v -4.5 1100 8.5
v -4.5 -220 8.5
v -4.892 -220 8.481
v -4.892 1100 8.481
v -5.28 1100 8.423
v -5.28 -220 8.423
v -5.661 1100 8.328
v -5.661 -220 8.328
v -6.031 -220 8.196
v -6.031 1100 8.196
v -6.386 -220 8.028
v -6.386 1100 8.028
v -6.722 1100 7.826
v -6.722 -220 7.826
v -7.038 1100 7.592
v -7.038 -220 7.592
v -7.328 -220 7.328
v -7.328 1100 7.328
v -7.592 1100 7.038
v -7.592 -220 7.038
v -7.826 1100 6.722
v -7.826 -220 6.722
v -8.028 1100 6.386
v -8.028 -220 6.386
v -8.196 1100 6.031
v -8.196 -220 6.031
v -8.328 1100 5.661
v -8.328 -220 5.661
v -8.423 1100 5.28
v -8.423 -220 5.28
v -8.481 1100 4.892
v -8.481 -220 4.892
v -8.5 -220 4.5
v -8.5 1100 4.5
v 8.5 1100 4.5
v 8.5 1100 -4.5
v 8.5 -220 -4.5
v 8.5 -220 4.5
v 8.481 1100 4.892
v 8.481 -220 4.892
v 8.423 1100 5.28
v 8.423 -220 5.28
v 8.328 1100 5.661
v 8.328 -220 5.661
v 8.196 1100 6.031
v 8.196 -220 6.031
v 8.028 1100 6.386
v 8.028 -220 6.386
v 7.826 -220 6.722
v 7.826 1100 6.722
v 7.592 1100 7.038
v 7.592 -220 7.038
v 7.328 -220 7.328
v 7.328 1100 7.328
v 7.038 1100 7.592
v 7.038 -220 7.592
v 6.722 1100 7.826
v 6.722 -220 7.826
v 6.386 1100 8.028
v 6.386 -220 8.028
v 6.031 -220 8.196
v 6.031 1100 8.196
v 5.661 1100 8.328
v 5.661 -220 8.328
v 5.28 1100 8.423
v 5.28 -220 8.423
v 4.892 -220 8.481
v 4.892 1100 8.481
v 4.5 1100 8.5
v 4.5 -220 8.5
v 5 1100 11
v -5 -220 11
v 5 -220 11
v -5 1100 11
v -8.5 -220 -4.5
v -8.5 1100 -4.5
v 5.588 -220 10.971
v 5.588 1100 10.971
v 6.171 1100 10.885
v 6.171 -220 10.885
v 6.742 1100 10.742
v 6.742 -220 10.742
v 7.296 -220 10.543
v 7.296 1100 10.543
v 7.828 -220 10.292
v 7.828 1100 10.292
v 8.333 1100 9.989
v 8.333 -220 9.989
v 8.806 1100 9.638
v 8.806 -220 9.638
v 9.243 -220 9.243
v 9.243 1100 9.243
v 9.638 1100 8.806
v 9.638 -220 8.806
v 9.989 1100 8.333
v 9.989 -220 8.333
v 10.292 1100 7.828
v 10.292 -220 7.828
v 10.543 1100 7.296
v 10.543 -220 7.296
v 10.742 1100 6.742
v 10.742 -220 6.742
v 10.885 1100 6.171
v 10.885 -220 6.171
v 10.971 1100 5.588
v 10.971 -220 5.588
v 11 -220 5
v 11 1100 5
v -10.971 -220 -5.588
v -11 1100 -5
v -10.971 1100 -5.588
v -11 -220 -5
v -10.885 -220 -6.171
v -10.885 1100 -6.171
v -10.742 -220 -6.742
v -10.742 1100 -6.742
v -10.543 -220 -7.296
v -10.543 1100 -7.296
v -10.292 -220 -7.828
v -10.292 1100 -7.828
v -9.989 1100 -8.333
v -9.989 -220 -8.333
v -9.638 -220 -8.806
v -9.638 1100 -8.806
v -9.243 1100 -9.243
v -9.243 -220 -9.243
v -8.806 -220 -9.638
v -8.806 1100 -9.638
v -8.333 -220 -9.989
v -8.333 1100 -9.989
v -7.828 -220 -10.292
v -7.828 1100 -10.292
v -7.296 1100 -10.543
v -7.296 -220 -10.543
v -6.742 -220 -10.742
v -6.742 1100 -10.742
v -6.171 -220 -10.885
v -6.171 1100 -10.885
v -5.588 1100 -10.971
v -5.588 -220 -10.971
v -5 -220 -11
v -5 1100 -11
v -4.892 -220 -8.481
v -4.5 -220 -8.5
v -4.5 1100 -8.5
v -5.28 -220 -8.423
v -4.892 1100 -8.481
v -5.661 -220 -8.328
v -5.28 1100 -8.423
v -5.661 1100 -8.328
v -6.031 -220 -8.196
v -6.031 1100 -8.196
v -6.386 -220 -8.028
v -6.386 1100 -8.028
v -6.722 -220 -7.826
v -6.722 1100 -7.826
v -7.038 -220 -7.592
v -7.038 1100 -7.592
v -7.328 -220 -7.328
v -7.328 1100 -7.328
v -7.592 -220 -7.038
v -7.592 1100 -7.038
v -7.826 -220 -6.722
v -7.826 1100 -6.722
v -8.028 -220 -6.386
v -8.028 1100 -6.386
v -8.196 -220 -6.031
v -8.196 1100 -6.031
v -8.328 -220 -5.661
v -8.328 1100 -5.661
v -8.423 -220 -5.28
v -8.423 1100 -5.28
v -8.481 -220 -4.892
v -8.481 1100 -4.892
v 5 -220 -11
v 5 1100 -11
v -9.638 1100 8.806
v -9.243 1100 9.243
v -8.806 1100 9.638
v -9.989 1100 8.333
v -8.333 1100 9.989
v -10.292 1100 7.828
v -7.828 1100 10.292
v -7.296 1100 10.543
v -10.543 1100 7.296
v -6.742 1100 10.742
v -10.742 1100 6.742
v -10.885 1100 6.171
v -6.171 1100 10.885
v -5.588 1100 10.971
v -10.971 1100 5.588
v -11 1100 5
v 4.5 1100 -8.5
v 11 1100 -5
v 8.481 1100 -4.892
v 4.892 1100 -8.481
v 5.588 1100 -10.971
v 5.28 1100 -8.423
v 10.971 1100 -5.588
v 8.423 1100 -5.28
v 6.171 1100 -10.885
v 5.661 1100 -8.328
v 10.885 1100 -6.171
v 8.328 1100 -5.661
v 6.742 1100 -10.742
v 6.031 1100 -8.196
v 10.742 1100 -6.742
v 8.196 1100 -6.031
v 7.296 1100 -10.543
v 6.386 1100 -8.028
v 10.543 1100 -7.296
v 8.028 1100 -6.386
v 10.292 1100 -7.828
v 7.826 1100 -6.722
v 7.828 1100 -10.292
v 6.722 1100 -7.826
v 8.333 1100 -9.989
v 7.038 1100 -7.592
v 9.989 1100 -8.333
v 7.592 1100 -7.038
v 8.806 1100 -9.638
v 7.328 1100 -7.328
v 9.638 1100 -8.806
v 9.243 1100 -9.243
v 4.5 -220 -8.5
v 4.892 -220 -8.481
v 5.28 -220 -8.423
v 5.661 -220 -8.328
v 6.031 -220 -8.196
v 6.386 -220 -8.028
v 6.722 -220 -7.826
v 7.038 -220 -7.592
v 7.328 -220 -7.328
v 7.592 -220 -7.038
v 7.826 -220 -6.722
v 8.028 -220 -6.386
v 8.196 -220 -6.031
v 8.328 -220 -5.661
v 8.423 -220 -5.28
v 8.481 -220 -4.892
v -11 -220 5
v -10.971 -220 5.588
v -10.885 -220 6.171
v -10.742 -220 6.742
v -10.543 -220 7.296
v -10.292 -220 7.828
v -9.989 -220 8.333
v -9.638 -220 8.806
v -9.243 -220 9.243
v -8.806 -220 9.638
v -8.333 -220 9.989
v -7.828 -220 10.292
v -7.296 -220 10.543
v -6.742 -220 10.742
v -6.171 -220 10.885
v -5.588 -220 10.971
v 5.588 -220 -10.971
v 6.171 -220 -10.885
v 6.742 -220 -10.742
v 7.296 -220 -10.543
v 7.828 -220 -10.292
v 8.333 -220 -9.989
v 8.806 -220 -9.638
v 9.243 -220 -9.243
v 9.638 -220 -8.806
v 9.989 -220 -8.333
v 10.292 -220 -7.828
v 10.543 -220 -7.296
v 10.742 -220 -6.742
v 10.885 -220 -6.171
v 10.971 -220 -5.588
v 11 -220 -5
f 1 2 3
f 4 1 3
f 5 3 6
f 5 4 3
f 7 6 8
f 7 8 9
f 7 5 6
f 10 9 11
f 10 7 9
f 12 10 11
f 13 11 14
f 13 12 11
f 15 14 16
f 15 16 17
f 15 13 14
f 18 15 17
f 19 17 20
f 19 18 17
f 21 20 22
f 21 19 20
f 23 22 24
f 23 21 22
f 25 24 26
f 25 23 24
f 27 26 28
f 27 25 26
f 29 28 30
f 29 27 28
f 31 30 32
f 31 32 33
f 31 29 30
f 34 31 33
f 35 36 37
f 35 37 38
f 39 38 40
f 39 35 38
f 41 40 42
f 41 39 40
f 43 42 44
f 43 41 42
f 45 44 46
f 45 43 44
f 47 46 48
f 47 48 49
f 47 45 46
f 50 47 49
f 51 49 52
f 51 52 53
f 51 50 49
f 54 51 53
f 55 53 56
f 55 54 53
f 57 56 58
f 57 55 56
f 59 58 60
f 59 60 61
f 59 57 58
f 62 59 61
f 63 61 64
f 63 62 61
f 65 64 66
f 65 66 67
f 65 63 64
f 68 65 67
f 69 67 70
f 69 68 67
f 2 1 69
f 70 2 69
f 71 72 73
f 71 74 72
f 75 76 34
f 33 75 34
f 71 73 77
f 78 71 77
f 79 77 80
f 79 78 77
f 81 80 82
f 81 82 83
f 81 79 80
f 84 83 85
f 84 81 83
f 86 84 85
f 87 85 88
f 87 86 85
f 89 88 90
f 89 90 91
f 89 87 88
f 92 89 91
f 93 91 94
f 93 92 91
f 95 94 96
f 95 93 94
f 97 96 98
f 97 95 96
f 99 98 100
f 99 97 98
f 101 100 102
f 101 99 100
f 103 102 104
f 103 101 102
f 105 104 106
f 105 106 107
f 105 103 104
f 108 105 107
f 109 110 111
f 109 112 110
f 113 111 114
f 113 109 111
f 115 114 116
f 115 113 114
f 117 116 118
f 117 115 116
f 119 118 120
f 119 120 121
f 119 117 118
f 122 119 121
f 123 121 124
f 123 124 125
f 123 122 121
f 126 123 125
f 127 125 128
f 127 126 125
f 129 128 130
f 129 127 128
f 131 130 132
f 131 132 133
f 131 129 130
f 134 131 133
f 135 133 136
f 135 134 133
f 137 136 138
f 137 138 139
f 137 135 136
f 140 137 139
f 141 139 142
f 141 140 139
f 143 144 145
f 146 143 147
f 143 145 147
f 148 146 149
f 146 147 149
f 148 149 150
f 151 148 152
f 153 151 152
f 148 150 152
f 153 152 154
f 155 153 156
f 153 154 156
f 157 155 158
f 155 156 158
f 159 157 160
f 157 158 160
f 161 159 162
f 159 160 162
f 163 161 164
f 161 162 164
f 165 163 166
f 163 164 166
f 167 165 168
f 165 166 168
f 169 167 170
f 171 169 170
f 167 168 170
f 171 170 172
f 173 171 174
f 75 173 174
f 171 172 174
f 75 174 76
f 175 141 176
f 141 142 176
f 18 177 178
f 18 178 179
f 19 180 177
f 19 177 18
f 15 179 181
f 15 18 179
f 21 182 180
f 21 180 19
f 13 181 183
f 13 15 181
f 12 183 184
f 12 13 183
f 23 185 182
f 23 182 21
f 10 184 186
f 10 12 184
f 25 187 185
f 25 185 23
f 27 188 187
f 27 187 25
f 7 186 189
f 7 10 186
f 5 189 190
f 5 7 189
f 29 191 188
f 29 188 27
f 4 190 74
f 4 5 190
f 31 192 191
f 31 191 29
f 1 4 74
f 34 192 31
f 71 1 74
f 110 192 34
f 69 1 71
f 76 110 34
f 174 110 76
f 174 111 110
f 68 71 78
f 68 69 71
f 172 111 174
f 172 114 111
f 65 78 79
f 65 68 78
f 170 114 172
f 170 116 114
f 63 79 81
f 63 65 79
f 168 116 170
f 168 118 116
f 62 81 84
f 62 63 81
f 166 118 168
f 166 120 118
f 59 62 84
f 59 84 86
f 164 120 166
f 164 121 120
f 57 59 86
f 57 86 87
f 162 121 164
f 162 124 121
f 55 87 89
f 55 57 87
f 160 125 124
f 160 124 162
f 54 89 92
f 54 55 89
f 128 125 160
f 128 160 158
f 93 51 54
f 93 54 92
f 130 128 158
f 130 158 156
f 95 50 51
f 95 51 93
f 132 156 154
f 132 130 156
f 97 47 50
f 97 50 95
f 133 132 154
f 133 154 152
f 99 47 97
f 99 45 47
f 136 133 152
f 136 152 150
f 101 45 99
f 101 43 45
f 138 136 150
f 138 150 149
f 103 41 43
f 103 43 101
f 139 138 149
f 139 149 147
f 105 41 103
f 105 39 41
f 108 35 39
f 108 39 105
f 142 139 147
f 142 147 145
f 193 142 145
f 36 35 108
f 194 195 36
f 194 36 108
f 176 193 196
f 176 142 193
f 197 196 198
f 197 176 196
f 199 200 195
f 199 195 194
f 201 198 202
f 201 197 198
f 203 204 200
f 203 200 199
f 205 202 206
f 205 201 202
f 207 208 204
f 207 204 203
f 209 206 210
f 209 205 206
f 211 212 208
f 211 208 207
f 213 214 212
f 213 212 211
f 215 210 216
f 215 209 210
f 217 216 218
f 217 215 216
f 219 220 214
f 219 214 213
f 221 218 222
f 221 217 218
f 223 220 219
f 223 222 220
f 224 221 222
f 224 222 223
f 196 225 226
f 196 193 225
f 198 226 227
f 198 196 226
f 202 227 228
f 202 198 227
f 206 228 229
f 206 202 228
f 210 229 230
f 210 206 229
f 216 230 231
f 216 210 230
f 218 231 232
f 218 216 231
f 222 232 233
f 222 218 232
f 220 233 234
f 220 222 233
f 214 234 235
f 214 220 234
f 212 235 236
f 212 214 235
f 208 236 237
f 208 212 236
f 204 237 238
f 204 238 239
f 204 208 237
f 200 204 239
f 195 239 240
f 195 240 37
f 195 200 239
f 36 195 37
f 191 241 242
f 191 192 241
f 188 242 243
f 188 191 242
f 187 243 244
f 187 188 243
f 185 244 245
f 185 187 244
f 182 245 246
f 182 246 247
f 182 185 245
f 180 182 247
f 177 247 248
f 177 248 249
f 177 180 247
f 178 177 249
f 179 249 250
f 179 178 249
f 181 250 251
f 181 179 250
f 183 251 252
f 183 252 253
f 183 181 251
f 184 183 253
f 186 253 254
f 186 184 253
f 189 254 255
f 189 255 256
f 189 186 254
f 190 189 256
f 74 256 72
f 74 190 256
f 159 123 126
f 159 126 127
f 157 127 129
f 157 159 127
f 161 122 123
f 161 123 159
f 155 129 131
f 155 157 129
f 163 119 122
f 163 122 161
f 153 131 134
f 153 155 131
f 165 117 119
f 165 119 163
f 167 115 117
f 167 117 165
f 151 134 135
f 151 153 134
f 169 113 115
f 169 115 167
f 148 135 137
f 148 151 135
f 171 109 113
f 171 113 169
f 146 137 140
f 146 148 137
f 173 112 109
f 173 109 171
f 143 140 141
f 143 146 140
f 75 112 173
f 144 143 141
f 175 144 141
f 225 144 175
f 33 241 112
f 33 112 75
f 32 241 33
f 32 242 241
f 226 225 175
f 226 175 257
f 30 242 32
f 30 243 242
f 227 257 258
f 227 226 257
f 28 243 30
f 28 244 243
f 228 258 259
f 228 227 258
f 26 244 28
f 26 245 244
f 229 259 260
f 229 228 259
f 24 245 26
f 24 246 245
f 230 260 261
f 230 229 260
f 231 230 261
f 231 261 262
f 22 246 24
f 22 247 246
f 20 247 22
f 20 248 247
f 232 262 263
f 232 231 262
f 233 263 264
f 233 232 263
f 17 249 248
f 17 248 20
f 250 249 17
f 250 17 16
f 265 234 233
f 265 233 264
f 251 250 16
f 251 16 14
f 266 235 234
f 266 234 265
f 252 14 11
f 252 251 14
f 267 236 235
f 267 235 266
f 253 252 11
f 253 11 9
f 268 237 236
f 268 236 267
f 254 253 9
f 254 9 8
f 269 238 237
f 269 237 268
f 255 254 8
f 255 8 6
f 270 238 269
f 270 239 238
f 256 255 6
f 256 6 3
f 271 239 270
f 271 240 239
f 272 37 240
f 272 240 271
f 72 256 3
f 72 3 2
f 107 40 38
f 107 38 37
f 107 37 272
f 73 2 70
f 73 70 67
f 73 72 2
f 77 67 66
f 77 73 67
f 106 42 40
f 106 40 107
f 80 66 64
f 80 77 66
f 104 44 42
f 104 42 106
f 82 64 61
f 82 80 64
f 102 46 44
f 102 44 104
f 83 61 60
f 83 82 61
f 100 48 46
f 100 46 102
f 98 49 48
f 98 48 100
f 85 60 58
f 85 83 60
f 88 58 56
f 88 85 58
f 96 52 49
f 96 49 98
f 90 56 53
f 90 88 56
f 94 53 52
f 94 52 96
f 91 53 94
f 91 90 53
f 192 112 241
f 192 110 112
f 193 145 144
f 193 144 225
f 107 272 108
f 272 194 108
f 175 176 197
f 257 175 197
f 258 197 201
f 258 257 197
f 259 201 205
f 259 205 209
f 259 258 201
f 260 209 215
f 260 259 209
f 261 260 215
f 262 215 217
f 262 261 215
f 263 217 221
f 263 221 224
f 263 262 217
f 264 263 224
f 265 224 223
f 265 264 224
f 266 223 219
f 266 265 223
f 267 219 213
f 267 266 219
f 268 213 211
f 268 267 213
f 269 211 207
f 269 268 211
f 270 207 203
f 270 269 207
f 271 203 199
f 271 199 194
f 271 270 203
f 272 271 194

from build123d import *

# Parameters (mm, degrees)
EXTRUDE_1_DEPTH      = 1100
EXTRUDE_1_DEPTH_BACK = 90
SKETCH_1_W           = 22
SKETCH_1_H           = 22
SKETCH_2_W           = 22
SKETCH_2_H           = 22
EXTRUDE_2_DEPTH      = 130
SKETCH1_W            = 17
SKETCH1_H            = 17
CUT_EXTRUDE1_DEPTH   = 1321.091663484
FILLET2_R            = 6
FILLET3_R            = 4


with BuildPart() as part:
    # Эскиз1 → Бобышка-Вытянуть1 (new, two sides: drawn at the far end of the back side and taken through both)
    with BuildSketch(Plane(origin=(0, 0, 0), x_dir=(1, 0, 0), z_dir=(0, 1, 0)).offset(-EXTRUDE_1_DEPTH_BACK)):
        Rectangle(SKETCH_1_W, SKETCH_1_H)
    extrude(amount=EXTRUDE_1_DEPTH + EXTRUDE_1_DEPTH_BACK)

    # Эскиз2 → Бобышка-Вытянуть2 (add)
    with BuildSketch(Plane.XZ.offset(90)):
        Rectangle(SKETCH_2_W, SKETCH_2_H)
    extrude(amount=EXTRUDE_2_DEPTH)

    # Sketch1 → Cut-Extrude1 (cut, through all)
    with BuildSketch(Plane.XZ.offset(220)):
        Rectangle(SKETCH1_W, SKETCH1_H)
    extrude(amount=-CUT_EXTRUDE1_DEPTH, mode=Mode.SUBTRACT)

    # Fillet2
    fillet2_edges = [part.edges().sort_by_distance(p)[0] for p in [
        (11, 440, 11),
        (-11, 440, 11),
        (-11, 440, -11),
        (11, 440, -11),
    ]]
    fillet(fillet2_edges, radius=FILLET2_R)

    # Fillet3
    fillet3_edges = [part.edges().sort_by_distance(p)[0] for p in [
        (8.5, 440, 8.5),
        (8.5, 440, -8.5),
        (-8.5, 440, -8.5),
        (-8.5, 440, 8.5),
    ]]
    fillet(fillet3_edges, radius=FILLET3_R)


solid = part.part
